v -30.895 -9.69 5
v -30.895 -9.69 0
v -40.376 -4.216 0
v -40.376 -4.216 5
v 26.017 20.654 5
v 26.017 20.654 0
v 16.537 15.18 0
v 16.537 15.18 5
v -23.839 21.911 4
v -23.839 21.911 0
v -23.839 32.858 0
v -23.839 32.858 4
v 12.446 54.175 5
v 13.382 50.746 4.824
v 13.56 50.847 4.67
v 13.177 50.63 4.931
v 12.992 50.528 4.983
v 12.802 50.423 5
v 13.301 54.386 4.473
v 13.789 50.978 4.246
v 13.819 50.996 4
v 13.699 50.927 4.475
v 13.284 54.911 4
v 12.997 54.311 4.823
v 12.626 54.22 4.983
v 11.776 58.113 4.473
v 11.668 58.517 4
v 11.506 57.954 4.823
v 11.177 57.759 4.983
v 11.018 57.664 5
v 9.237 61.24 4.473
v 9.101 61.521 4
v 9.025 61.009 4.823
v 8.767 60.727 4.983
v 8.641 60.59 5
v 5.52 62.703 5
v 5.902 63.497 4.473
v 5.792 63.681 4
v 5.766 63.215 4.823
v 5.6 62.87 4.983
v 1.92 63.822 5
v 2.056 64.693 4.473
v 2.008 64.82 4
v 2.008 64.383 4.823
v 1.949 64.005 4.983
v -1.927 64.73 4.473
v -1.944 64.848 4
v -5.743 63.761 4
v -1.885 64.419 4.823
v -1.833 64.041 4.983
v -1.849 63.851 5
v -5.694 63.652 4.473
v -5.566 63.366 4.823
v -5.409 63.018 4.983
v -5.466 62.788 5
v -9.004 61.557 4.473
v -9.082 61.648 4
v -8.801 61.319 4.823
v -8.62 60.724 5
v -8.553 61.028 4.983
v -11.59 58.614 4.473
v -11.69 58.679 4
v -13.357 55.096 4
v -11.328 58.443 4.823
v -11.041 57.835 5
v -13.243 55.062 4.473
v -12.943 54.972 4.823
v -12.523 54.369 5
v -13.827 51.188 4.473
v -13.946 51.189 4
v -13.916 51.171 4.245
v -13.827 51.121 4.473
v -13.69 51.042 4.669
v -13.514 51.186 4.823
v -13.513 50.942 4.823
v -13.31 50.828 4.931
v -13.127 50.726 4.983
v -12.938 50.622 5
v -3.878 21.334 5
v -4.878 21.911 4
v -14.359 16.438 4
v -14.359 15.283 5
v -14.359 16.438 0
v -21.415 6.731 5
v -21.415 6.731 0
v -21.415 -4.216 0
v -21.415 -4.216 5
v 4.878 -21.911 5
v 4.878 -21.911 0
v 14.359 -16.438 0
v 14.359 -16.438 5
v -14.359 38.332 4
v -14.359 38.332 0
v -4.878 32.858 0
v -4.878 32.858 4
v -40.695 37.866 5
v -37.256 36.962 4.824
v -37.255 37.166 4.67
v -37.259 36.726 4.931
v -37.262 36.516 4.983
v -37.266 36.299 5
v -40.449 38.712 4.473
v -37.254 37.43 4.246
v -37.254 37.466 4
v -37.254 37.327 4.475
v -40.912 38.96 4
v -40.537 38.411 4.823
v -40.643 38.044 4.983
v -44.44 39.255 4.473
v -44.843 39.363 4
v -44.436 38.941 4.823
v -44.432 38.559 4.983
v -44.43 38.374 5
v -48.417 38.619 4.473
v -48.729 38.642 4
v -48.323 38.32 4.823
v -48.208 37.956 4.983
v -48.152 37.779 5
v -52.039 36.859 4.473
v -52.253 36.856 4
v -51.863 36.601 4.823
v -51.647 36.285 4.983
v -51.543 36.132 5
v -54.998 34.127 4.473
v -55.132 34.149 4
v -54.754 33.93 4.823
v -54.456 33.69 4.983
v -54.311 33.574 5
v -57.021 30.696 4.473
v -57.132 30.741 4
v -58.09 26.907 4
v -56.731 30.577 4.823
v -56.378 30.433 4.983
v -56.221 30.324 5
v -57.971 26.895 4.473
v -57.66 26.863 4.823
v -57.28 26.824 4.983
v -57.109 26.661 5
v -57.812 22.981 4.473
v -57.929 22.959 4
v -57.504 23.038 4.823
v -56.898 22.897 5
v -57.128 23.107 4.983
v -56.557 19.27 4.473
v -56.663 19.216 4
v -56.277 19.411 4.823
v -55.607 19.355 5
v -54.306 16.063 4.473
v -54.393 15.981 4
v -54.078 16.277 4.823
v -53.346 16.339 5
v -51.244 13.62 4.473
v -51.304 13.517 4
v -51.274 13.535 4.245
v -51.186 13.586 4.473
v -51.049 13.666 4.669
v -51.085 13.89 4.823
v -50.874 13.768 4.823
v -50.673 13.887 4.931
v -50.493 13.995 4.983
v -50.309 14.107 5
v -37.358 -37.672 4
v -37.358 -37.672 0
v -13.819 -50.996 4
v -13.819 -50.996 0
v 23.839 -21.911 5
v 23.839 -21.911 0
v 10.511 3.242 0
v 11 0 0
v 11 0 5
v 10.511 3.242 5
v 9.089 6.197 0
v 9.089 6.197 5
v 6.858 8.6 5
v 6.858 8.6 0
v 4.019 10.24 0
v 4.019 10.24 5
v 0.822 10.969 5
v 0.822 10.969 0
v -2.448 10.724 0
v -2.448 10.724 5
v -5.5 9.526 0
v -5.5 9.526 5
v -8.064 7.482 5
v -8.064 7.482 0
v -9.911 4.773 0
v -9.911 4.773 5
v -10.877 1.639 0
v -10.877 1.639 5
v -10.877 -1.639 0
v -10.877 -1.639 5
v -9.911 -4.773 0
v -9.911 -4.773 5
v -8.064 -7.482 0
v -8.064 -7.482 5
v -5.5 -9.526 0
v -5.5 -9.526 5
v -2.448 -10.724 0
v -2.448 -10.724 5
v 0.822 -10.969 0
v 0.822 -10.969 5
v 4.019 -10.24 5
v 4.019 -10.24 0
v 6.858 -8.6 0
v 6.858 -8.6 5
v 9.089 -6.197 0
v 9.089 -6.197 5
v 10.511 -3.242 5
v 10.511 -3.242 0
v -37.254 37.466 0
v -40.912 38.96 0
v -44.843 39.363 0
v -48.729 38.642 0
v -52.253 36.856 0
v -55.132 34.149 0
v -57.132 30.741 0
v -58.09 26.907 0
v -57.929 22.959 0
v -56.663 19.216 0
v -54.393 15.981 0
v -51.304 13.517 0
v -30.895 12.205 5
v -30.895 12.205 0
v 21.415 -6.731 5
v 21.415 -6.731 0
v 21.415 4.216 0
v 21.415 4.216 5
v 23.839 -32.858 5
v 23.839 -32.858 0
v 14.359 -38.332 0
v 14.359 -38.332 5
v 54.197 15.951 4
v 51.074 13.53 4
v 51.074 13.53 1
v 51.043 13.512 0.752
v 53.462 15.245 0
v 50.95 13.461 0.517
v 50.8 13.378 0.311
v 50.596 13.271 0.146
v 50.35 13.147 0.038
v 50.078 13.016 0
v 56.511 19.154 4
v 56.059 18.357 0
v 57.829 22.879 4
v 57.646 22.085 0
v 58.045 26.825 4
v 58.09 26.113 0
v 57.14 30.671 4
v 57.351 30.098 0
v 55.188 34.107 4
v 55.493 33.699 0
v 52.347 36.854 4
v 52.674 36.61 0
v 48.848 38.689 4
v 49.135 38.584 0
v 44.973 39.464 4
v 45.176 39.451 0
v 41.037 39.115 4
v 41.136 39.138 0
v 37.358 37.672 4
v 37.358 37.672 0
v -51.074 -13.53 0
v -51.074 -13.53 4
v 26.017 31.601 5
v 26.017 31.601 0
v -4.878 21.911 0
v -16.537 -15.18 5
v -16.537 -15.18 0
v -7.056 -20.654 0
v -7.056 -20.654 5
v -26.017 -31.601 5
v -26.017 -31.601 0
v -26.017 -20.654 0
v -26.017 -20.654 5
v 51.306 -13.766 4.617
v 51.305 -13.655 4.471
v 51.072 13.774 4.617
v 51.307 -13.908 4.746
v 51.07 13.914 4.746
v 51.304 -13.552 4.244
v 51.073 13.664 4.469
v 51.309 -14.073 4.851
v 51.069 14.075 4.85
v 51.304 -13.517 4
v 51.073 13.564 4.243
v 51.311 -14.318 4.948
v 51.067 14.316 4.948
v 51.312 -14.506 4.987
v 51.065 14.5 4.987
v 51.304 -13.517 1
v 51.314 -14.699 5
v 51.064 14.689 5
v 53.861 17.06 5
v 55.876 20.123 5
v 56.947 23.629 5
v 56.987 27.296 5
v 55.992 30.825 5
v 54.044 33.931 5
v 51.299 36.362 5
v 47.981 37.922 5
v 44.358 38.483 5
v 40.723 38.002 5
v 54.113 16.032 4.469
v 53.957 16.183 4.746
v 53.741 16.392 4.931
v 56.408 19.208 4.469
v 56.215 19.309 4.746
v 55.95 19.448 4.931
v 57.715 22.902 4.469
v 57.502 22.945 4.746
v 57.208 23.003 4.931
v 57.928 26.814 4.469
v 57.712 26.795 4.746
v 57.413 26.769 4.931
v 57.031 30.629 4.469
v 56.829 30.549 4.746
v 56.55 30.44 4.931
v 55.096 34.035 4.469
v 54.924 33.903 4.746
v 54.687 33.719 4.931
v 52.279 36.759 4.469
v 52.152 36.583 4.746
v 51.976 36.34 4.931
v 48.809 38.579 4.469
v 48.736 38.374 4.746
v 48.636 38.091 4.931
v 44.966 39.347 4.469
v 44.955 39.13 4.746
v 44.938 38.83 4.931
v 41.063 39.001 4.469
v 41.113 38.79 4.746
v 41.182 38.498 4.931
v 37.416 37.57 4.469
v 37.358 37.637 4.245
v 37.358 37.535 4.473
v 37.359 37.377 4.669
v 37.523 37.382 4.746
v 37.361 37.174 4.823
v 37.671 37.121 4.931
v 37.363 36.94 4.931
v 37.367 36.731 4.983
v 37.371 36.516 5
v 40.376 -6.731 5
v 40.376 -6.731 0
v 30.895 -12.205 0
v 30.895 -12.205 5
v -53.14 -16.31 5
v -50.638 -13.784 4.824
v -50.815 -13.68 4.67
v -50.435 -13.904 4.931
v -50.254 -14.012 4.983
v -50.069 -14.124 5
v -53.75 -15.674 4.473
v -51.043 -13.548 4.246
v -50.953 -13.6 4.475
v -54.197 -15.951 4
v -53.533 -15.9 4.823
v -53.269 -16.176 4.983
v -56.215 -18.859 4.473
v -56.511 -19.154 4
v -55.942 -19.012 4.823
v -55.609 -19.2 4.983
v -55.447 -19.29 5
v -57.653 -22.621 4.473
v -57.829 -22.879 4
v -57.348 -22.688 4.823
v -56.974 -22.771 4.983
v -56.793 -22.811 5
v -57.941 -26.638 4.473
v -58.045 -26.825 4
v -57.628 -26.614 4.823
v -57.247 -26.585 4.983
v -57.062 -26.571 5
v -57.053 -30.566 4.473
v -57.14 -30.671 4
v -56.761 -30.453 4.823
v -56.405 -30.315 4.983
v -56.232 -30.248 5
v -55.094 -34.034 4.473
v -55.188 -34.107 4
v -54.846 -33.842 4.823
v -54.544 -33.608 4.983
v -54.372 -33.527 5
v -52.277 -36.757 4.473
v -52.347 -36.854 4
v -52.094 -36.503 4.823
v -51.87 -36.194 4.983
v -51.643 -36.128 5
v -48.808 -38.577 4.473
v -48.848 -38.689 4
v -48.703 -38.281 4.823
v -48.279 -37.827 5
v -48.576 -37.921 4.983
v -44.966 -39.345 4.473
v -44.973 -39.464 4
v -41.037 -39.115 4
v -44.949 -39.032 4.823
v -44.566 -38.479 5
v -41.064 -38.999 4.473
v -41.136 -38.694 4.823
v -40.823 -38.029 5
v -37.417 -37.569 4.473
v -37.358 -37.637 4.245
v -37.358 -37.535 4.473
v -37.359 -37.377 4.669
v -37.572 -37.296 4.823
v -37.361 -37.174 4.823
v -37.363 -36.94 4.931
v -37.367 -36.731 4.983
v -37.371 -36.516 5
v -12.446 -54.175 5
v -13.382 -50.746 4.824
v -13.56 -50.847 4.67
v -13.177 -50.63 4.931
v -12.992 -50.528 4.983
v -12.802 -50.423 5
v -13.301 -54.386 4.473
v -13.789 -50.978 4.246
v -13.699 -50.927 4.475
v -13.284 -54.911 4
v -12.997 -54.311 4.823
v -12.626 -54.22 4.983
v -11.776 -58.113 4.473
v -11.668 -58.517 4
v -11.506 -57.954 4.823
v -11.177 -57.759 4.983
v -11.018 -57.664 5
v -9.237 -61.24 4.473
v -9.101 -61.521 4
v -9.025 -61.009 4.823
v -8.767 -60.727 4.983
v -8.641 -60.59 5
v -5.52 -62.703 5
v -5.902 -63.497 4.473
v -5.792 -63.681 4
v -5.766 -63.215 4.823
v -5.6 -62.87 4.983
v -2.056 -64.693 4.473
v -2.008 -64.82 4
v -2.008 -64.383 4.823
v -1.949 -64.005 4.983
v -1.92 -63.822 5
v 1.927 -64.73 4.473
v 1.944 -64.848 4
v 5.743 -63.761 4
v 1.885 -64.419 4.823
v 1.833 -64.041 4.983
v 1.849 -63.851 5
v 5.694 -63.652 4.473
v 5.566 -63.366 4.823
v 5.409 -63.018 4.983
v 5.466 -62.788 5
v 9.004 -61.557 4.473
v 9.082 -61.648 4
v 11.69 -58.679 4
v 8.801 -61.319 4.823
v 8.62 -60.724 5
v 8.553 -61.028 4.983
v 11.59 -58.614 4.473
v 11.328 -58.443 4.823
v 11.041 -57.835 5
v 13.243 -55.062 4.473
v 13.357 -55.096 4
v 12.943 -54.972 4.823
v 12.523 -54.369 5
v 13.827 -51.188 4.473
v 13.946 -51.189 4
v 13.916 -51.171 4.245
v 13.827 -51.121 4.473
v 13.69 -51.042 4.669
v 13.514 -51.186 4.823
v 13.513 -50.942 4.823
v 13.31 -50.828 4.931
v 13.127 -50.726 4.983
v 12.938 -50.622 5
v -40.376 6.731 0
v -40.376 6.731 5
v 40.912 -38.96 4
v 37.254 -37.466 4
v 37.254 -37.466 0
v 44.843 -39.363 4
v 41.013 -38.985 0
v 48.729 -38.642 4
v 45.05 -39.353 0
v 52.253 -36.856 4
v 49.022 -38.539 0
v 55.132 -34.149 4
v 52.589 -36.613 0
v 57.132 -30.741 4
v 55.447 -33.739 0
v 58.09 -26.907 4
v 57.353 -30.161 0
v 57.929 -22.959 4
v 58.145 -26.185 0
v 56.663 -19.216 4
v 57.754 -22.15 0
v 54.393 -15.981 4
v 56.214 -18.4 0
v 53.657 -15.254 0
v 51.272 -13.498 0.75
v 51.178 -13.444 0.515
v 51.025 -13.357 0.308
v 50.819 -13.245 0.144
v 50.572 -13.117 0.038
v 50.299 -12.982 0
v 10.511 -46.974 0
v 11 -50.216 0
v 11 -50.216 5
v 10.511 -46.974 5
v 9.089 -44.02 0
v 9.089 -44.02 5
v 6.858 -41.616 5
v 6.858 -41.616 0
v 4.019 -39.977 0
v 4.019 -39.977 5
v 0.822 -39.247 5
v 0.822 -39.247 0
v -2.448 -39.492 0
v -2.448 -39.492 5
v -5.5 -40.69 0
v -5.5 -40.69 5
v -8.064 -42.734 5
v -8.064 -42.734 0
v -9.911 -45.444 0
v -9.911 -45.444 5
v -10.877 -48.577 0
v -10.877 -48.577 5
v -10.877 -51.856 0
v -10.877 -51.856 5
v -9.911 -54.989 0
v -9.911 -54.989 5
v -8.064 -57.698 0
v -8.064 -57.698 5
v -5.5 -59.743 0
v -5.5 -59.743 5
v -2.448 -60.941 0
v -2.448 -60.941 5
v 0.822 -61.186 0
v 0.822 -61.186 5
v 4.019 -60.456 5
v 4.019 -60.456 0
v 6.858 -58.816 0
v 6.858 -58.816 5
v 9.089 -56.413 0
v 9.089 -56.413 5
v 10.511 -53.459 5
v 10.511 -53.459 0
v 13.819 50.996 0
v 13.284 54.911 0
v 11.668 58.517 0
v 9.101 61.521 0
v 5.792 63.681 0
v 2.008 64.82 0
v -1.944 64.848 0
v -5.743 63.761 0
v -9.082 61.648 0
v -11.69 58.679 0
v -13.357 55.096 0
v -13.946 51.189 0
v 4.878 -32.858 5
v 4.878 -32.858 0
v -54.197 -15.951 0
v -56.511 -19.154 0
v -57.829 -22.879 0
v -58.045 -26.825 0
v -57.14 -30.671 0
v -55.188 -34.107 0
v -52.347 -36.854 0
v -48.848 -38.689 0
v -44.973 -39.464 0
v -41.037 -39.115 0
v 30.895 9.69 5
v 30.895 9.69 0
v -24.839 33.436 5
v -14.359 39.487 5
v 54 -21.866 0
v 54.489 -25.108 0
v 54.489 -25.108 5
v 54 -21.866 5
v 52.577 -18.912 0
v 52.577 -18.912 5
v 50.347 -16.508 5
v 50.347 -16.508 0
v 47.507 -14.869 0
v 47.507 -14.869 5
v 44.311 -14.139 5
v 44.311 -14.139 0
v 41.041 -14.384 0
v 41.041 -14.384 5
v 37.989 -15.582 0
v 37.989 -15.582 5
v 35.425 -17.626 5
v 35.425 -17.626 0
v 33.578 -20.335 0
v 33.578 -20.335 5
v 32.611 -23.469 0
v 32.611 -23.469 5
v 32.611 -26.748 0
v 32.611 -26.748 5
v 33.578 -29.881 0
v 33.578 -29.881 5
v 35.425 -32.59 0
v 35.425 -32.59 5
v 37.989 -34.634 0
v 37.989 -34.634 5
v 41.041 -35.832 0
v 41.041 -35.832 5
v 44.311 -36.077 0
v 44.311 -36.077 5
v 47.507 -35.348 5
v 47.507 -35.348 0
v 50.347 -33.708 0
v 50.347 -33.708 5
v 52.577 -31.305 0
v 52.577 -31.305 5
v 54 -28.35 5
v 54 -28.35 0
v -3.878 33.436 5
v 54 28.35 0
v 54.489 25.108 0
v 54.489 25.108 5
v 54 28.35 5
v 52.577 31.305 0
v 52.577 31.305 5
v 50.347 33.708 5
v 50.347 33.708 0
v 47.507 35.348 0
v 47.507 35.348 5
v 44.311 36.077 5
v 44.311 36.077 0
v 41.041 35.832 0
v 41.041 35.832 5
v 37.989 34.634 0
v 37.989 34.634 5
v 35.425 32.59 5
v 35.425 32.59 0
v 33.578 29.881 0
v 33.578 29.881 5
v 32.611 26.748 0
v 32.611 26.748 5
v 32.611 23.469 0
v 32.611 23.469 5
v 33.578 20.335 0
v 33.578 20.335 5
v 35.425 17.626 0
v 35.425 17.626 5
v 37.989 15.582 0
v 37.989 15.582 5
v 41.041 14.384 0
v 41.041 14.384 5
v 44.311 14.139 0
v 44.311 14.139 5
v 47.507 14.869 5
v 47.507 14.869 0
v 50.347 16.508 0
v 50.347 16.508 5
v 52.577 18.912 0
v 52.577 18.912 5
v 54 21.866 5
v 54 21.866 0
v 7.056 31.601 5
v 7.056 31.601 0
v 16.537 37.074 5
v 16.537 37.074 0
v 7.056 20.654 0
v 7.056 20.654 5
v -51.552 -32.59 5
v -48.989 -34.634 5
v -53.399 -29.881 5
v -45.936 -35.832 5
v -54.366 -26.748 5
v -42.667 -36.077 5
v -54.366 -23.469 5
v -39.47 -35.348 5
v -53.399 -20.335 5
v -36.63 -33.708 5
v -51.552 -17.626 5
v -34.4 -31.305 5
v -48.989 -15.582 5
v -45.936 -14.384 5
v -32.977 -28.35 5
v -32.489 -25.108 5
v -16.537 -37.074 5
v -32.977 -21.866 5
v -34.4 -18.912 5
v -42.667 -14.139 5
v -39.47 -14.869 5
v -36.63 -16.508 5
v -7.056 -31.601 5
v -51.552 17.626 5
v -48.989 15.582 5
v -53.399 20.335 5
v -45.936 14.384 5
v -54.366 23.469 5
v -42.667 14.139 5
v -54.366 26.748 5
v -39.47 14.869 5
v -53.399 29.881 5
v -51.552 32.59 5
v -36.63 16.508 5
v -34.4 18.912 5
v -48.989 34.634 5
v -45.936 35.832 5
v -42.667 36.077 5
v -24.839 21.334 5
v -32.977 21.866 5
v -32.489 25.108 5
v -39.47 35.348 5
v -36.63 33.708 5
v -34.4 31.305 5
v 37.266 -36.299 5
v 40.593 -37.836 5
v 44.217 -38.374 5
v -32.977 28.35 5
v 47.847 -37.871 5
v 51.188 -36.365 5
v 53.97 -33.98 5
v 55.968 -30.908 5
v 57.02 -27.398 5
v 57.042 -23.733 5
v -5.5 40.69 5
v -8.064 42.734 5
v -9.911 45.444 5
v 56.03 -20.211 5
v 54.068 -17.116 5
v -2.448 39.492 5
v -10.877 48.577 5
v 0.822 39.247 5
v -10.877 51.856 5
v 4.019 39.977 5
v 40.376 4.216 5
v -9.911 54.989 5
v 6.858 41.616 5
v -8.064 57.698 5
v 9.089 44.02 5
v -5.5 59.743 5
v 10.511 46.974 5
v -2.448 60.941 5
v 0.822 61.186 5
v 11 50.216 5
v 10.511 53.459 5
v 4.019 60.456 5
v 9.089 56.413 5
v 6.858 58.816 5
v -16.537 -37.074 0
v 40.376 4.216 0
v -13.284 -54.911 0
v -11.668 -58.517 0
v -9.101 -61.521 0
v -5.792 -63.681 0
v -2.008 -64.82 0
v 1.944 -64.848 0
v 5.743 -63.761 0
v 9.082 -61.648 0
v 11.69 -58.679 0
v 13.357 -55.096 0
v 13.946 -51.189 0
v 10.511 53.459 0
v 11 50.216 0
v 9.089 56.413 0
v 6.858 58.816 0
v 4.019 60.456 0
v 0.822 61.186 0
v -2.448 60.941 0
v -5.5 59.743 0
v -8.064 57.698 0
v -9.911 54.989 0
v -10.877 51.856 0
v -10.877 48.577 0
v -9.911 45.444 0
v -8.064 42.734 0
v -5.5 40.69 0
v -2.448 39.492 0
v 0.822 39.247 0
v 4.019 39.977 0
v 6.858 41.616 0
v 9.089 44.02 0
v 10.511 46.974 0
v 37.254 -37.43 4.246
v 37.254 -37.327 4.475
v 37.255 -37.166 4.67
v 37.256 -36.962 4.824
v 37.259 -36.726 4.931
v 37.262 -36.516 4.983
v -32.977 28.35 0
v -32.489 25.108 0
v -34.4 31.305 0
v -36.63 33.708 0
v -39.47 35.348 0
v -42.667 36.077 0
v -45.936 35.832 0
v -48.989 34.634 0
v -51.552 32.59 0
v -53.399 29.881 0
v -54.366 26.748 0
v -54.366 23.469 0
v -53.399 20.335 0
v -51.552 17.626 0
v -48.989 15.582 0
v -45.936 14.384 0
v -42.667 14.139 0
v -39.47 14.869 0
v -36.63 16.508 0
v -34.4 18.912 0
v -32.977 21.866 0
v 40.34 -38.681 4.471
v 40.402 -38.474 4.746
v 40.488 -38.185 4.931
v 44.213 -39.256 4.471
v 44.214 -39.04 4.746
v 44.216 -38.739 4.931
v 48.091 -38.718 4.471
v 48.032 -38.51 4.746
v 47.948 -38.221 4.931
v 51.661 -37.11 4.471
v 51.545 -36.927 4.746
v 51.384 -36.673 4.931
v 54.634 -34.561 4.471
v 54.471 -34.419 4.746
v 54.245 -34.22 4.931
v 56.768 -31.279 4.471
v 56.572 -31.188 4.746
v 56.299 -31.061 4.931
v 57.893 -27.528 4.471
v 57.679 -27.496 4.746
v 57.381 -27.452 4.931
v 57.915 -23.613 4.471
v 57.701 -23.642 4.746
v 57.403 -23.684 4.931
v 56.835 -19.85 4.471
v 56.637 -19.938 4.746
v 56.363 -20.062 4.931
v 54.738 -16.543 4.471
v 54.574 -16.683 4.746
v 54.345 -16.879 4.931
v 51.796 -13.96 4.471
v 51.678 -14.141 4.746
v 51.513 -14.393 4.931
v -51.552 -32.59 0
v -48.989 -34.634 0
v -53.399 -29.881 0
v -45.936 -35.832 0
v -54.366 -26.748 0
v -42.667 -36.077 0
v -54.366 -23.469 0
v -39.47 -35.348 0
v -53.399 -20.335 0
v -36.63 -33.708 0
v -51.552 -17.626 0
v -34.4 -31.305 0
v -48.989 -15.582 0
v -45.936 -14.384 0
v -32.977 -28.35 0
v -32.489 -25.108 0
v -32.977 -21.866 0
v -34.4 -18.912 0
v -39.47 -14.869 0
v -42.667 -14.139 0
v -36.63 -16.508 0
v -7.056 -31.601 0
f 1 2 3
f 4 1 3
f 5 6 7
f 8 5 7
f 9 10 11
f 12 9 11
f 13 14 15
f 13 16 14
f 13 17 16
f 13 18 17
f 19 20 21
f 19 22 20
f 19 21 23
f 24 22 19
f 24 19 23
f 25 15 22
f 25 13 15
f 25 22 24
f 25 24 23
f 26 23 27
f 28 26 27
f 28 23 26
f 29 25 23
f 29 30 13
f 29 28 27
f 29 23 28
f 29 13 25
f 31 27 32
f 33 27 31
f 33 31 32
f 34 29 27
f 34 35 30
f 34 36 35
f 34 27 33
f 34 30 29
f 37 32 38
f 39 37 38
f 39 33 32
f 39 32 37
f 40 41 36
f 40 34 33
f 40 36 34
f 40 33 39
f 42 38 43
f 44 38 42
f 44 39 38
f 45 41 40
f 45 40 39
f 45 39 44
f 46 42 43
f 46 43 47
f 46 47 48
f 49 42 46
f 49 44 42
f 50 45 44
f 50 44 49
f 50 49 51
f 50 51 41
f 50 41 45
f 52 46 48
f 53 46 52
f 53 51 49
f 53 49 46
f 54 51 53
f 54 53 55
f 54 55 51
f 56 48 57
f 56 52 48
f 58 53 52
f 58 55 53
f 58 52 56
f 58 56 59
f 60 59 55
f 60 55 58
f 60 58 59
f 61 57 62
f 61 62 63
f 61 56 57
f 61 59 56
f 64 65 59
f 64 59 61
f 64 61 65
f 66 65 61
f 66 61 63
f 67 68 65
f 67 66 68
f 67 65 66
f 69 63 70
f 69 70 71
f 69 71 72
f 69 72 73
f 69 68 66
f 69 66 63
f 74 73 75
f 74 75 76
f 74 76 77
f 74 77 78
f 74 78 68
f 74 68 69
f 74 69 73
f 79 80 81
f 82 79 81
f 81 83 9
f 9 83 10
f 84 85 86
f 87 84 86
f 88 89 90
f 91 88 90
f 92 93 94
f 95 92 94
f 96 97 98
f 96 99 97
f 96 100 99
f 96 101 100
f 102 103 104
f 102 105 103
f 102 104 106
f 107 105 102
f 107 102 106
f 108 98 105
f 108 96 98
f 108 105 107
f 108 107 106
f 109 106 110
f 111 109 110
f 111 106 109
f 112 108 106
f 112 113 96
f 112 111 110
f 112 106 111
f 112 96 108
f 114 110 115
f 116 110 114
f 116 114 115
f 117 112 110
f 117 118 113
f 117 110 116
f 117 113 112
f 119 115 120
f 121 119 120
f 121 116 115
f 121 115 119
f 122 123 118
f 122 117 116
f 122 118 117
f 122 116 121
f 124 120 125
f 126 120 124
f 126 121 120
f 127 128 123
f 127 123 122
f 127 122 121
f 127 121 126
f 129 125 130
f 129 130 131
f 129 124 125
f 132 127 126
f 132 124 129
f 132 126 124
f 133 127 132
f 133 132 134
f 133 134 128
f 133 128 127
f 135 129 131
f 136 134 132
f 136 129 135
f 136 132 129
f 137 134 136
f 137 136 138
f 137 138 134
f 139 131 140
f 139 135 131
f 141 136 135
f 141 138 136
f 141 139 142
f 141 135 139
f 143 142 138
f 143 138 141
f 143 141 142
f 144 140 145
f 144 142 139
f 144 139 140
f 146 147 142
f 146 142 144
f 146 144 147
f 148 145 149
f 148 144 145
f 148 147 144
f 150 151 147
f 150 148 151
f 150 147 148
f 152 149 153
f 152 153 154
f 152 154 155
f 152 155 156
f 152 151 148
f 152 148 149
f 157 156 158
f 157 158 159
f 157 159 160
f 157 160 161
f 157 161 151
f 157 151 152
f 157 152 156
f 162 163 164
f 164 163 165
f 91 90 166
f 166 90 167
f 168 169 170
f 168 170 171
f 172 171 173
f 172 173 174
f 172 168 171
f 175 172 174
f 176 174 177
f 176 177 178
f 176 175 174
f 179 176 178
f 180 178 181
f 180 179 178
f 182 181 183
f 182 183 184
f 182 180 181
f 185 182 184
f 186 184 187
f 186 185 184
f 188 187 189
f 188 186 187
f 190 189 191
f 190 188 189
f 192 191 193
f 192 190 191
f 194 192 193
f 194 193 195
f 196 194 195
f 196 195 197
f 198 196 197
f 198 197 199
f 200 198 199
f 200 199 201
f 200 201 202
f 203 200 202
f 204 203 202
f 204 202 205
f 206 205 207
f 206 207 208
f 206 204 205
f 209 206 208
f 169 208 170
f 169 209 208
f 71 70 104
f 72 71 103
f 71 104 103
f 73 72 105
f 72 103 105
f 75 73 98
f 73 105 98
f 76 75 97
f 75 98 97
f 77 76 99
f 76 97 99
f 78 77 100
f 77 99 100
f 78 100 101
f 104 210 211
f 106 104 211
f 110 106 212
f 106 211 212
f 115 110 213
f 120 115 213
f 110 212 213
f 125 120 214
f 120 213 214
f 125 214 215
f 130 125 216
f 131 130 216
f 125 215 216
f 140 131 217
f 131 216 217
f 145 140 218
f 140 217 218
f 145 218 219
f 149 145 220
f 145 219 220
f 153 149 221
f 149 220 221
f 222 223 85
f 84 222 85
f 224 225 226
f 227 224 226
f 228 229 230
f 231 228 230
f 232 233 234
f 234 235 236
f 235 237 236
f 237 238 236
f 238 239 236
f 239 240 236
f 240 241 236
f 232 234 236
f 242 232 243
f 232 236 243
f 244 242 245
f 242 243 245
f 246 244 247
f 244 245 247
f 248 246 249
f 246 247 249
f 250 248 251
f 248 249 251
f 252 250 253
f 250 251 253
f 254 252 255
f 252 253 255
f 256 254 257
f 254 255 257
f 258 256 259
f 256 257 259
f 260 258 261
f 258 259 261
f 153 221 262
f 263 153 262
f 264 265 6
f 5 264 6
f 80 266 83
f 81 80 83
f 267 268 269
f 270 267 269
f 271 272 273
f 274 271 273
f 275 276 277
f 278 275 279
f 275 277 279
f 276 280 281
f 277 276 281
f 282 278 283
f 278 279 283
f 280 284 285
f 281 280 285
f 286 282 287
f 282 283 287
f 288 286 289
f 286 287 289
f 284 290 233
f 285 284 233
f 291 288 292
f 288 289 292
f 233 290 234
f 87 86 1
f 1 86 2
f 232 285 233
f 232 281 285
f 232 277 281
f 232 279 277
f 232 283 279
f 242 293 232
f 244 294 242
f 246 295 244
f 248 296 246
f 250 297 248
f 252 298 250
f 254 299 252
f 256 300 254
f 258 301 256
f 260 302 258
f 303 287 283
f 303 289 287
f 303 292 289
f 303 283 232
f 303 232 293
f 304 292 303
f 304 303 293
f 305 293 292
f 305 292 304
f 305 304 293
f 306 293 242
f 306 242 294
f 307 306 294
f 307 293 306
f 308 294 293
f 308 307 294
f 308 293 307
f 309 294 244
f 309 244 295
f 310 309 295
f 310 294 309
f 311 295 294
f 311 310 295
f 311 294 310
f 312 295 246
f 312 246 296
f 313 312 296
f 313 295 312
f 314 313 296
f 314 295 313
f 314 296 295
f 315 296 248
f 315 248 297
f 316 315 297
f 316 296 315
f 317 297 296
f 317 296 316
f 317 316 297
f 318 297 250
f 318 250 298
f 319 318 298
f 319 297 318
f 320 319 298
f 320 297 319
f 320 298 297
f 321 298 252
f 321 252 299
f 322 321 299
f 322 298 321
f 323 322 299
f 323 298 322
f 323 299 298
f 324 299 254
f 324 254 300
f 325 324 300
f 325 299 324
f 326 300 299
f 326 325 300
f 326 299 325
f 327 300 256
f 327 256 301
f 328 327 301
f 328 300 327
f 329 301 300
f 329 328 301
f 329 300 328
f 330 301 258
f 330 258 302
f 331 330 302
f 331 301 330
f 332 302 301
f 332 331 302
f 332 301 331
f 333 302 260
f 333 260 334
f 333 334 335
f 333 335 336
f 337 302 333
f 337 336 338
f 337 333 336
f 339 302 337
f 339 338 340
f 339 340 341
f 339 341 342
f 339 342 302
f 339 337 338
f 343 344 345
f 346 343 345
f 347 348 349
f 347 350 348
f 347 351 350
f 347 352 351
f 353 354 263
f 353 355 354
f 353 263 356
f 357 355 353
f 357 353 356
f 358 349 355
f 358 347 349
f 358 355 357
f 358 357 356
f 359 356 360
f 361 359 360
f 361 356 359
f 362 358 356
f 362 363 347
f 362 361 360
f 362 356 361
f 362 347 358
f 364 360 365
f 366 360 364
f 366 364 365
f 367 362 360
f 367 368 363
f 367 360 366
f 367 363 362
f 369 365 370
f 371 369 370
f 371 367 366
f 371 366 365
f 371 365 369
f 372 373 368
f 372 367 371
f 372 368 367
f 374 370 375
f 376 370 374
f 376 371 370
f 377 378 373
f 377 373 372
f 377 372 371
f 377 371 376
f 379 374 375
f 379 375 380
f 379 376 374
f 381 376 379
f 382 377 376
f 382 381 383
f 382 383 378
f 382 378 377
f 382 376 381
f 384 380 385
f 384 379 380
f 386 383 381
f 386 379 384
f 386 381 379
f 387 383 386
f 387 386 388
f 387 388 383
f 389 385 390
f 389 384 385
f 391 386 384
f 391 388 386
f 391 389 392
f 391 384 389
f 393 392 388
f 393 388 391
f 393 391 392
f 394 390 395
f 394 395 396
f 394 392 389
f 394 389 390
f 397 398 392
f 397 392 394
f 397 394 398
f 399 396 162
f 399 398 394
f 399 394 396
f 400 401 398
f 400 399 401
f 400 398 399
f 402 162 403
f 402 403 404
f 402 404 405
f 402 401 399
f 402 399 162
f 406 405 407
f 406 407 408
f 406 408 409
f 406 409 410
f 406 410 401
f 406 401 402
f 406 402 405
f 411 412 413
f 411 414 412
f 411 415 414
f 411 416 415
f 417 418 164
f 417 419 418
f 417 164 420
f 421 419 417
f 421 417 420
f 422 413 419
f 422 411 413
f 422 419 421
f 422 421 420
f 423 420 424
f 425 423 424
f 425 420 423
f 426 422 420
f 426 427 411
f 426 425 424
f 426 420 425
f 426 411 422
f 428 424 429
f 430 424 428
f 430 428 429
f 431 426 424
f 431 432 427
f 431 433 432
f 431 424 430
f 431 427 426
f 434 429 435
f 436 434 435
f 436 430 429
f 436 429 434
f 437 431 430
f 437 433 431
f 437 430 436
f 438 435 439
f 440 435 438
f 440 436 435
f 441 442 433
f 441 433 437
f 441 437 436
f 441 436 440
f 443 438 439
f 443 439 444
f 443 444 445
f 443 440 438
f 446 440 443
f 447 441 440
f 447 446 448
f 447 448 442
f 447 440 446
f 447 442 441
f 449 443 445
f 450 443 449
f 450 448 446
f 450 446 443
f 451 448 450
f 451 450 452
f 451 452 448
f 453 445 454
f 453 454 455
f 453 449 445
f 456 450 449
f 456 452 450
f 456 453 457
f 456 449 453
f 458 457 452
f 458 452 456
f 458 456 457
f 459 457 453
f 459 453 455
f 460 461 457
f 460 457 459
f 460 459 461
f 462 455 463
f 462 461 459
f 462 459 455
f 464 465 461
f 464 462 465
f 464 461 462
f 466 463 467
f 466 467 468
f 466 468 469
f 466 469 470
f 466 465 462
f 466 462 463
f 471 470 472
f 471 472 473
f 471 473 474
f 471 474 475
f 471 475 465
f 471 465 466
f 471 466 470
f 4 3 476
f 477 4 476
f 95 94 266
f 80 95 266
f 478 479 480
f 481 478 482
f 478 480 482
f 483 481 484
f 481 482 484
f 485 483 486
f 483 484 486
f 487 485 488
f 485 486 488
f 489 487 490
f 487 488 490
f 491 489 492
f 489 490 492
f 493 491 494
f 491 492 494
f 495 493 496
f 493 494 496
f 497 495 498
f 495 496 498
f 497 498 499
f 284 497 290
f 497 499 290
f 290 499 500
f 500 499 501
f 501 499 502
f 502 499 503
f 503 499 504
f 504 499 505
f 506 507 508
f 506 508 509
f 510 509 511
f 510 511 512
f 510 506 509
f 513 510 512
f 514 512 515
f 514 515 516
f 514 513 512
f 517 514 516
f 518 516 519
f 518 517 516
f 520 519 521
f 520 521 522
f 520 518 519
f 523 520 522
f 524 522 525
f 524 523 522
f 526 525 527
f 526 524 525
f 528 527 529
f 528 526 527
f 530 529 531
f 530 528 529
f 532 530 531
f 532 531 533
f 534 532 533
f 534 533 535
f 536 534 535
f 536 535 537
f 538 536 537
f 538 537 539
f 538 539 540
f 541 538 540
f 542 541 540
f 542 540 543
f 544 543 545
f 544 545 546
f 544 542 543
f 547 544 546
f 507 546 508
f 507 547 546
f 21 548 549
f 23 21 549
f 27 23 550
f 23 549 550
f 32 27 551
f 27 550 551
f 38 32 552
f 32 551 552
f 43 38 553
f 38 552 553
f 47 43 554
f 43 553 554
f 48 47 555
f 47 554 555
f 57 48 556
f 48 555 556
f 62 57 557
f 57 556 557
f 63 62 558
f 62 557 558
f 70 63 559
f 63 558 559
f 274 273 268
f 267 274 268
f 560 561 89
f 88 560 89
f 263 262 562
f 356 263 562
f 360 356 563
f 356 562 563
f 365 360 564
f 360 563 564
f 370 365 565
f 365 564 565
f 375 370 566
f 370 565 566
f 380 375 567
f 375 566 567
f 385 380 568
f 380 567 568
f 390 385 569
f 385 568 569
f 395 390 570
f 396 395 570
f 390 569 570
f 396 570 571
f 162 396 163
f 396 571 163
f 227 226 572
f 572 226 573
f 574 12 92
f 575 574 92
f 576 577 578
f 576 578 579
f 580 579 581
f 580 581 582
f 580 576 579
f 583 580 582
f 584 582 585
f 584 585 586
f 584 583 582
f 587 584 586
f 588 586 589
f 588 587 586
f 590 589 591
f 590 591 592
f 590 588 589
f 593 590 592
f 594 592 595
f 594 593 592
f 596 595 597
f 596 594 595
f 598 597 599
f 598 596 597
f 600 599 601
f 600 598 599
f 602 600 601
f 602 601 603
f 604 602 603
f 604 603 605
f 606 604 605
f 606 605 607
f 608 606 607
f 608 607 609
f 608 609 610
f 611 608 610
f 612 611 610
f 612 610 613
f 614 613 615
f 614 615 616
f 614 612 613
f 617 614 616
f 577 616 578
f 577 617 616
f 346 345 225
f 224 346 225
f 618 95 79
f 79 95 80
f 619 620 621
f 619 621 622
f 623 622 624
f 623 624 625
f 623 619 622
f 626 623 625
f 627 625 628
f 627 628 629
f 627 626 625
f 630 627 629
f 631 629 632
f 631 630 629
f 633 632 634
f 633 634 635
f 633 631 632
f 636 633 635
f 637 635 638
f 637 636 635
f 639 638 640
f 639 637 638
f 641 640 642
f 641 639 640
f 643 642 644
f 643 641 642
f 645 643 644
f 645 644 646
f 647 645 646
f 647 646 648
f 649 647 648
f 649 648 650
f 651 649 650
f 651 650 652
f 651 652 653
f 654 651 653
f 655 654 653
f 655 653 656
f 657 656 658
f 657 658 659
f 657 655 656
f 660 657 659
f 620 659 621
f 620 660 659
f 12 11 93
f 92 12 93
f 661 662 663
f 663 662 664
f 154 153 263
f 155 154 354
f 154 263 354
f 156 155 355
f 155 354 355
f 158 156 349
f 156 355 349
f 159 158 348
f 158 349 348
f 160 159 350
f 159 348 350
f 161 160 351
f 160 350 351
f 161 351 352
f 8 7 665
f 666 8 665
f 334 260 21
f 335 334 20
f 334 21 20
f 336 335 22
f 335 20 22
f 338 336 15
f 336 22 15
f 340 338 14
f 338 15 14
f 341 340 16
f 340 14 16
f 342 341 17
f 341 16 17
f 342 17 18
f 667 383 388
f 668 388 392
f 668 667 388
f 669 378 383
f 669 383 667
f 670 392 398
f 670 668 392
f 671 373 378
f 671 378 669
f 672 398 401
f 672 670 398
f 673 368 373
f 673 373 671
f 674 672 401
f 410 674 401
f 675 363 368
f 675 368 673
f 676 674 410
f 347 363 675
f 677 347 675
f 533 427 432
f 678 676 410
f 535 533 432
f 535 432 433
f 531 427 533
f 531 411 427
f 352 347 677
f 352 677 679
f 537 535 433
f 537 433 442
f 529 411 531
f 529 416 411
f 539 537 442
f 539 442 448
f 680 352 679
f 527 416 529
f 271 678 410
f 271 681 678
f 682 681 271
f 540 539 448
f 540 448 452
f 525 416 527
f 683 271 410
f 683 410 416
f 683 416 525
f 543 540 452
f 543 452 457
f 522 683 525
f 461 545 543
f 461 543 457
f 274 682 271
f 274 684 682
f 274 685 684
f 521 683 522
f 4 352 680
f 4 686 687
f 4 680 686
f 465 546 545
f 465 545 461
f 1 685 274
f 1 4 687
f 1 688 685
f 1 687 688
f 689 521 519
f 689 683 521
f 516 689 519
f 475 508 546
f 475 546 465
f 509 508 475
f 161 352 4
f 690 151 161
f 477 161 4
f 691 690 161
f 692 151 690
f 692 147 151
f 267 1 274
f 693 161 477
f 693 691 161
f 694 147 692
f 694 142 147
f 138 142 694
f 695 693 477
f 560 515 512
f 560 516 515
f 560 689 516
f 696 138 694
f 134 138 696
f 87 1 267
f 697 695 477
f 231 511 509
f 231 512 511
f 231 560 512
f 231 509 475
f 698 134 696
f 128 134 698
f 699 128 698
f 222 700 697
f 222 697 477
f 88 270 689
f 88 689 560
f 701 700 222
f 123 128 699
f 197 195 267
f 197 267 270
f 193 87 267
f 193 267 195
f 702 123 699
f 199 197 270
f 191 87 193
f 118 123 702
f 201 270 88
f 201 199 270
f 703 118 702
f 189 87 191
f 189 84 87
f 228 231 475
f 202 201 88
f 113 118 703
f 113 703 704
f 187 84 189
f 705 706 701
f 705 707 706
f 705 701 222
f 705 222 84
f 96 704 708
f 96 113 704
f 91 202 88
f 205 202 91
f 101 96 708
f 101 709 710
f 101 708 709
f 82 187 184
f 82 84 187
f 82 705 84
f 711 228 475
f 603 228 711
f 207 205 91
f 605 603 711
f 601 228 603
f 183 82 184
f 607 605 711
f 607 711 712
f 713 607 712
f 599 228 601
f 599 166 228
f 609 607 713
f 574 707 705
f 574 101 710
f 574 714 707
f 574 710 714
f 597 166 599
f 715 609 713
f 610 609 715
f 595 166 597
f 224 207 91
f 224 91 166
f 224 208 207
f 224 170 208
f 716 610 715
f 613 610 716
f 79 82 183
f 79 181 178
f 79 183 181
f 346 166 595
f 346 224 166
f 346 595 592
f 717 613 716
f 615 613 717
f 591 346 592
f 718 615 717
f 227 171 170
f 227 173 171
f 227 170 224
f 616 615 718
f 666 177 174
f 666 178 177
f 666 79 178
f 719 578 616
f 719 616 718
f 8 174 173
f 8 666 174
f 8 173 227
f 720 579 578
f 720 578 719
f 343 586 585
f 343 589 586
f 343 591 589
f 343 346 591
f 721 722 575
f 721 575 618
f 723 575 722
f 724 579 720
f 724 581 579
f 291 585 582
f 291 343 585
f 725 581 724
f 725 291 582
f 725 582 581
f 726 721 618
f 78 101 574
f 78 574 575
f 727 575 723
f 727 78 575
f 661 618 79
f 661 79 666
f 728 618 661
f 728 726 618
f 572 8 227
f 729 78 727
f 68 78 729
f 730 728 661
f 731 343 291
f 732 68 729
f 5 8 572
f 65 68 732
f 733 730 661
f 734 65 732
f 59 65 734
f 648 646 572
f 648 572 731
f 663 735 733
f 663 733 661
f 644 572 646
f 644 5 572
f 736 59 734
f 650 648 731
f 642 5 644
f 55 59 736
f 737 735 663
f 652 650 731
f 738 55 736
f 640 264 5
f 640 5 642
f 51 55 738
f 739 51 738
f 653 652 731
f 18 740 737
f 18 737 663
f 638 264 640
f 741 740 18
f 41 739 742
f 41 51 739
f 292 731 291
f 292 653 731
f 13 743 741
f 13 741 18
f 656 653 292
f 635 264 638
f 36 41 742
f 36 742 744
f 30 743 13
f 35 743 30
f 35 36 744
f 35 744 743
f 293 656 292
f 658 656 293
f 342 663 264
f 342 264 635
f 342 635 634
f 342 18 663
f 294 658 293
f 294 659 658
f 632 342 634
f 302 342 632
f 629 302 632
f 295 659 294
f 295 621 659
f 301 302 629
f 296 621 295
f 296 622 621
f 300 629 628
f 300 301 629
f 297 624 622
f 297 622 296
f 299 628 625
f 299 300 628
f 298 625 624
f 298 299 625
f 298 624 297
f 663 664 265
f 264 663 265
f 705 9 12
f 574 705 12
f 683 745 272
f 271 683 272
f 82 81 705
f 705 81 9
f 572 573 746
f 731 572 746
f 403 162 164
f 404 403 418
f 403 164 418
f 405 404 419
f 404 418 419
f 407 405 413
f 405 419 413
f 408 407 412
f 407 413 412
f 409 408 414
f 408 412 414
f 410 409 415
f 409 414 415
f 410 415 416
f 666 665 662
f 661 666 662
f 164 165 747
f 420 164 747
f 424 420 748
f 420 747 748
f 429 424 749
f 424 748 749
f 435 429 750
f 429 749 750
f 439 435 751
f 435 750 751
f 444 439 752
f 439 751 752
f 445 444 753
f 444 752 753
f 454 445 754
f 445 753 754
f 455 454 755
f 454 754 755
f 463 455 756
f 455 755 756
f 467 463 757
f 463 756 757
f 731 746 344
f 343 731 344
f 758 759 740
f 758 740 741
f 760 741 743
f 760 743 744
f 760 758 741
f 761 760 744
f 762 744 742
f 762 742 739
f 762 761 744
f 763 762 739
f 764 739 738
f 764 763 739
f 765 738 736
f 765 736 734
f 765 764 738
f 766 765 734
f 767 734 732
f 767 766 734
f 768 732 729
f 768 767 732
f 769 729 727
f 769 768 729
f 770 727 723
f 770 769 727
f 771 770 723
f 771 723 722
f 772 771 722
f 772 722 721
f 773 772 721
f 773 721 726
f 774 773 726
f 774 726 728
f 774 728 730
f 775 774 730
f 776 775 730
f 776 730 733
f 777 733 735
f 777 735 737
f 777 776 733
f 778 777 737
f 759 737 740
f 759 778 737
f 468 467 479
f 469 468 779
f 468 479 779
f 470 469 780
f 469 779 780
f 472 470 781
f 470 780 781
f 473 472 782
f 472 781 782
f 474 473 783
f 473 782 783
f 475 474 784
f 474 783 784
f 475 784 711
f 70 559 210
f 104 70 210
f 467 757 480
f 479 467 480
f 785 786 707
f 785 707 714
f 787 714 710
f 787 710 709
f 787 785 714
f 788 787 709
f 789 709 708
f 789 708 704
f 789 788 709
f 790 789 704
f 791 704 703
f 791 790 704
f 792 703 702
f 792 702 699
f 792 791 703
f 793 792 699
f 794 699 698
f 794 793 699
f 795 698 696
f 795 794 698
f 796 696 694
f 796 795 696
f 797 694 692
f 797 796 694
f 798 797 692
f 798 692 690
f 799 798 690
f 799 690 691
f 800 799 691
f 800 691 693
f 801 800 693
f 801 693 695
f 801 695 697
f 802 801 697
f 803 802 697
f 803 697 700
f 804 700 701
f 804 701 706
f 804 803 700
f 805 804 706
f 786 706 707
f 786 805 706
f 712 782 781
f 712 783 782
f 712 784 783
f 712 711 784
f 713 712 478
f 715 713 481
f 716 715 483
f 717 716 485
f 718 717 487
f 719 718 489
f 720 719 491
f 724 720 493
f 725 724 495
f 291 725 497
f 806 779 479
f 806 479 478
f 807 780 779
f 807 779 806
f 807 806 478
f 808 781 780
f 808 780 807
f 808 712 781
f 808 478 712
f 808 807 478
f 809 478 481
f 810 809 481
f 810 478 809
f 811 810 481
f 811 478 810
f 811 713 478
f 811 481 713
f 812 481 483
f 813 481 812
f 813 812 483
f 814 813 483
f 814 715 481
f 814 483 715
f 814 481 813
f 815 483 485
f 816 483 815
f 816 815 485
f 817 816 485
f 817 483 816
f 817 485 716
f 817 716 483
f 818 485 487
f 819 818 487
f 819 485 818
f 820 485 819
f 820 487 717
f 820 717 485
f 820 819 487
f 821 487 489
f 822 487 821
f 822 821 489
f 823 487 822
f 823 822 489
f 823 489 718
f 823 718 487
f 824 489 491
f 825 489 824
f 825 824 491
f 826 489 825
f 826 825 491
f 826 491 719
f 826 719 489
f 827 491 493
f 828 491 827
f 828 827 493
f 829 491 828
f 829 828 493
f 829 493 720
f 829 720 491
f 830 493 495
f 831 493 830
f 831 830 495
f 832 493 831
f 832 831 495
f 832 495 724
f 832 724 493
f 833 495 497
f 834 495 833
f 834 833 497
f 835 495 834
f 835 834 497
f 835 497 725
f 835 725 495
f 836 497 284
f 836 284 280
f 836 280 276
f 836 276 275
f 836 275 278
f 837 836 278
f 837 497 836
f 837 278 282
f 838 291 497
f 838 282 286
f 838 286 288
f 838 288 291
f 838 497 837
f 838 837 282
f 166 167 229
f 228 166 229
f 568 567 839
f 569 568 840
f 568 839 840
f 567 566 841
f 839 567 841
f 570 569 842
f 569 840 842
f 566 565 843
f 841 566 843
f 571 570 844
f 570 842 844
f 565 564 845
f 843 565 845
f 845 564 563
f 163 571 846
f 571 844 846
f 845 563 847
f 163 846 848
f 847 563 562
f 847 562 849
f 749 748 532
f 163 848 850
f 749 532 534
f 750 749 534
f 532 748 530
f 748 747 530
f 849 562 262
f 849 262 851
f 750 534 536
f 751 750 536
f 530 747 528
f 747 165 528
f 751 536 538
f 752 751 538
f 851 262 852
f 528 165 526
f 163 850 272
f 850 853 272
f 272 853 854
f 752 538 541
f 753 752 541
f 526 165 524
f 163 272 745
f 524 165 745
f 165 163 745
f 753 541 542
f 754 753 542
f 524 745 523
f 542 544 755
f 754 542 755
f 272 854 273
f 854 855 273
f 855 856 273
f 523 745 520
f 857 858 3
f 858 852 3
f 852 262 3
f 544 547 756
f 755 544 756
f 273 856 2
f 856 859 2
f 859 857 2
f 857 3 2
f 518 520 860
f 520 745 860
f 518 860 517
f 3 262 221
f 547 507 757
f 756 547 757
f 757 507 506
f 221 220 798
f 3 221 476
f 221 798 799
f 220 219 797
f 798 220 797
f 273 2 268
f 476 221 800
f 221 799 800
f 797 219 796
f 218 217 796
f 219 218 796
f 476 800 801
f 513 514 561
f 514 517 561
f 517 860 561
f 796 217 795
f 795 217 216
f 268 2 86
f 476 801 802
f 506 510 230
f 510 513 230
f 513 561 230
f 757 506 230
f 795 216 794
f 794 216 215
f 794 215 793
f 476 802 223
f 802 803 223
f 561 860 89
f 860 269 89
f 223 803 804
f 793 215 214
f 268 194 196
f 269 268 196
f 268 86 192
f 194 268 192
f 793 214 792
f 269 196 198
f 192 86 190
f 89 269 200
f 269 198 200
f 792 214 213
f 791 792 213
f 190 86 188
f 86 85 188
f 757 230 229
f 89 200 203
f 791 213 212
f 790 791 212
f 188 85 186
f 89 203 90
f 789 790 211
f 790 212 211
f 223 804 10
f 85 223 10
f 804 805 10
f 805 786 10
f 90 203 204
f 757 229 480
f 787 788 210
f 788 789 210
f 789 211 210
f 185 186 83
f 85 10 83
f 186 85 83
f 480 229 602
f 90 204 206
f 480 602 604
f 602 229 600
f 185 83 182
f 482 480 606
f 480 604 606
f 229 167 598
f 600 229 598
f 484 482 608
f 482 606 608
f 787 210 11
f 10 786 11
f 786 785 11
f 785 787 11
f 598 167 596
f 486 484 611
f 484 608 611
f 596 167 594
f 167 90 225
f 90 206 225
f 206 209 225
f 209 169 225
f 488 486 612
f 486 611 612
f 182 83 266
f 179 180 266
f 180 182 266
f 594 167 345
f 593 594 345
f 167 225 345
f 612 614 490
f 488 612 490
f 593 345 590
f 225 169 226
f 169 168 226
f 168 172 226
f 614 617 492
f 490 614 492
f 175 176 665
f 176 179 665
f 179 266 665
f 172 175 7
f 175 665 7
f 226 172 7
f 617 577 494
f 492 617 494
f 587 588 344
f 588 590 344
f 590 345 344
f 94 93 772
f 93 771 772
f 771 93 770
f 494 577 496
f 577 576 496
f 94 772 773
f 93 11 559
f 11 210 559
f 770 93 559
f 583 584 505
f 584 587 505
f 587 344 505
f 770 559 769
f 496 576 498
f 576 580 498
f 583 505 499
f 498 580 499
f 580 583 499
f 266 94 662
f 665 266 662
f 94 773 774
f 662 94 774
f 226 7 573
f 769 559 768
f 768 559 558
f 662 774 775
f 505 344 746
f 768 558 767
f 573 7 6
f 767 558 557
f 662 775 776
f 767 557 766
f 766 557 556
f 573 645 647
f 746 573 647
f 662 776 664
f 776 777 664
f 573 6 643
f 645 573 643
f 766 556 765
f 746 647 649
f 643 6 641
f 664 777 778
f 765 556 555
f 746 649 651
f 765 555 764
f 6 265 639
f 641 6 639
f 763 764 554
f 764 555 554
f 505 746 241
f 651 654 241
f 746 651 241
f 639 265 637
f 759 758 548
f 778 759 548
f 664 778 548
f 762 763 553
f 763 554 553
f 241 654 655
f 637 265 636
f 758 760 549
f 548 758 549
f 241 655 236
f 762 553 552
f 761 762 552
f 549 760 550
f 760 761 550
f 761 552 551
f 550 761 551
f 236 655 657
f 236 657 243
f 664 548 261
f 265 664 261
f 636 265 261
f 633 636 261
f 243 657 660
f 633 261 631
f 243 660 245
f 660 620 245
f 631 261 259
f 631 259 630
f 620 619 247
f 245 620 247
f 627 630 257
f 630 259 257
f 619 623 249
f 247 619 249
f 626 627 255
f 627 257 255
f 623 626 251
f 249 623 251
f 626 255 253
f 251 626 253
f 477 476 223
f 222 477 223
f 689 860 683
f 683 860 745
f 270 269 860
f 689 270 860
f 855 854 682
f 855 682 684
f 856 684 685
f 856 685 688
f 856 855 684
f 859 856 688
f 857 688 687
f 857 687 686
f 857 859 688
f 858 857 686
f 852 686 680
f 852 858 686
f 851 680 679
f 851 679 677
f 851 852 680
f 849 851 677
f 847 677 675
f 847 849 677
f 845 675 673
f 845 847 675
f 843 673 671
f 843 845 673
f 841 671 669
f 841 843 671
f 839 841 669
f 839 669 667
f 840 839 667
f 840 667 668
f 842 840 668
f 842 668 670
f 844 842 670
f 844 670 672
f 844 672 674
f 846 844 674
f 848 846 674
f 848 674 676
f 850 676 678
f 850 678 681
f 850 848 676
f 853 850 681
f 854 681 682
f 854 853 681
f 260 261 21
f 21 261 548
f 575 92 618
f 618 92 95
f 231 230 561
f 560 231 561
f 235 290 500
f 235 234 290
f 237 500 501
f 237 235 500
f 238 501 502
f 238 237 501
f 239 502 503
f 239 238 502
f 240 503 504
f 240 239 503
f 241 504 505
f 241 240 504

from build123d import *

# Parameters (mm, degrees)
F0_R     = 11
F1_DEPTH = 5
F2_R     = 1
F3_SIZE  = 1


with BuildPart() as f1:
    # F0 (on Top) → F1 (new body)
    with BuildSketch(Plane.XY):
        with BuildLine():
            Line((37.357962, 37.672123), (13.8195, 50.996188))
            ThreePointArc((13.8195, 50.996188), (0.033141, 64.975364), (-13.946035, 51.189005))
            Line((-13.946035, 51.189005), (-37.254244, 37.466132))
            ThreePointArc((-37.254244, 37.466132), (-56.253745, 32.516383), (-51.303997, 13.516882))
            Line((-51.303997, 13.516882), (-51.073744, -13.530056))
            ThreePointArc((-51.073744, -13.530056), (-56.286887, -32.458981), (-37.357962, -37.672123))
            Line((-37.357962, -37.672123), (-13.8195, -50.996188))
            ThreePointArc((-13.8195, -50.996188), (-0.033141, -64.975364), (13.946035, -51.189005))
            Line((13.946035, -51.189005), (37.254244, -37.466132))
            ThreePointArc((37.254244, -37.466132), (56.253745, -32.516383), (51.303997, -13.516882))
            Line((51.303997, -13.516882), (51.073744, 13.530056))
            ThreePointArc((51.073744, 13.530056), (56.286887, 32.458981), (37.357962, 37.672123))
        make_face()
        with Locations((-43.488632, -25.108173)):
            Circle(F0_R, mode=Mode.SUBTRACT)
        Polygon((-7.056279, -20.653774), (-7.056279, -31.60084), (-16.536716, -37.074373), (-26.017154, -31.60084), (-26.017154, -20.653774), (-16.536716, -15.180241), align=None, mode=Mode.SUBTRACT)
        with Locations((0, -50.216347)):
            Circle(F0_R, mode=Mode.SUBTRACT)
        Polygon((14.358553, -16.437804), (23.83899, -21.911337), (23.83899, -32.858403), (14.358553, -38.331936), (4.878116, -32.858403), (4.878116, -21.911337), align=None, mode=Mode.SUBTRACT)
        with Locations((43.488632, -25.108173)):
            Circle(F0_R, mode=Mode.SUBTRACT)
        Polygon((21.414832, 4.21597), (30.895269, 9.689503), (40.375707, 4.21597), (40.375707, -6.731096), (30.895269, -12.204629), (21.414832, -6.731096), align=None, mode=Mode.SUBTRACT)
        Polygon((-21.414832, -4.21597), (-30.895269, -9.689503), (-40.375707, -4.21597), (-40.375707, 6.731096), (-30.895269, 12.204629), (-21.414832, 6.731096), align=None, mode=Mode.SUBTRACT)
        with Locations((-43.488632, 25.108173)):
            Circle(F0_R, mode=Mode.SUBTRACT)
        Polygon((-14.358553, 38.331936), (-4.878116, 32.858403), (-4.878116, 21.911337), (-14.358553, 16.437804), (-23.83899, 21.911337), (-23.83899, 32.858403), align=None, mode=Mode.SUBTRACT)
        Circle(F0_R, mode=Mode.SUBTRACT)
        Polygon((7.056279, 20.653774), (7.056279, 31.60084), (16.536716, 37.074373), (26.017154, 31.60084), (26.017154, 20.653774), (16.536716, 15.180241), align=None, mode=Mode.SUBTRACT)
        with Locations((43.488632, 25.108173)):
            Circle(F0_R, mode=Mode.SUBTRACT)
        with Locations((0, 50.216347)):
            Circle(F0_R, mode=Mode.SUBTRACT)
    extrude(amount=F1_DEPTH)

    # F2
    f2_edges = [f1.edges().sort_by_distance(p)[0] for p in [
        (-25.588731, -44.334156, 5),
        (-56.286887, -32.458981, 5),
        (-51.18887, -0.006587, 5),
        (-56.253745, 32.516383, 5),
        (-25.60014, 44.327569, 5),
        (0.033141, 64.975364, 5),
        (25.588731, 44.334156, 5),
        (56.286887, 32.458981, 5),
        (51.18887, 0.006587, 0),
        (56.253745, -32.516383, 5),
        (25.60014, -44.327569, 5),
        (-0.033141, -64.975364, 5),
    ]]
    fillet(f2_edges, radius=F2_R)

    # F3
    f3_edges = [f1.edges().sort_by_distance(p)[0] for p in [
        (-19.098772, 35.595169, 5),
        (-9.618334, 35.595169, 5),
        (-4.878116, 27.38487, 5),
        (-9.618334, 19.17457, 5),
        (-19.098772, 19.17457, 5),
        (-23.83899, 27.38487, 5),
    ]]
    chamfer(f3_edges, length=F3_SIZE)


solid = f1.part
